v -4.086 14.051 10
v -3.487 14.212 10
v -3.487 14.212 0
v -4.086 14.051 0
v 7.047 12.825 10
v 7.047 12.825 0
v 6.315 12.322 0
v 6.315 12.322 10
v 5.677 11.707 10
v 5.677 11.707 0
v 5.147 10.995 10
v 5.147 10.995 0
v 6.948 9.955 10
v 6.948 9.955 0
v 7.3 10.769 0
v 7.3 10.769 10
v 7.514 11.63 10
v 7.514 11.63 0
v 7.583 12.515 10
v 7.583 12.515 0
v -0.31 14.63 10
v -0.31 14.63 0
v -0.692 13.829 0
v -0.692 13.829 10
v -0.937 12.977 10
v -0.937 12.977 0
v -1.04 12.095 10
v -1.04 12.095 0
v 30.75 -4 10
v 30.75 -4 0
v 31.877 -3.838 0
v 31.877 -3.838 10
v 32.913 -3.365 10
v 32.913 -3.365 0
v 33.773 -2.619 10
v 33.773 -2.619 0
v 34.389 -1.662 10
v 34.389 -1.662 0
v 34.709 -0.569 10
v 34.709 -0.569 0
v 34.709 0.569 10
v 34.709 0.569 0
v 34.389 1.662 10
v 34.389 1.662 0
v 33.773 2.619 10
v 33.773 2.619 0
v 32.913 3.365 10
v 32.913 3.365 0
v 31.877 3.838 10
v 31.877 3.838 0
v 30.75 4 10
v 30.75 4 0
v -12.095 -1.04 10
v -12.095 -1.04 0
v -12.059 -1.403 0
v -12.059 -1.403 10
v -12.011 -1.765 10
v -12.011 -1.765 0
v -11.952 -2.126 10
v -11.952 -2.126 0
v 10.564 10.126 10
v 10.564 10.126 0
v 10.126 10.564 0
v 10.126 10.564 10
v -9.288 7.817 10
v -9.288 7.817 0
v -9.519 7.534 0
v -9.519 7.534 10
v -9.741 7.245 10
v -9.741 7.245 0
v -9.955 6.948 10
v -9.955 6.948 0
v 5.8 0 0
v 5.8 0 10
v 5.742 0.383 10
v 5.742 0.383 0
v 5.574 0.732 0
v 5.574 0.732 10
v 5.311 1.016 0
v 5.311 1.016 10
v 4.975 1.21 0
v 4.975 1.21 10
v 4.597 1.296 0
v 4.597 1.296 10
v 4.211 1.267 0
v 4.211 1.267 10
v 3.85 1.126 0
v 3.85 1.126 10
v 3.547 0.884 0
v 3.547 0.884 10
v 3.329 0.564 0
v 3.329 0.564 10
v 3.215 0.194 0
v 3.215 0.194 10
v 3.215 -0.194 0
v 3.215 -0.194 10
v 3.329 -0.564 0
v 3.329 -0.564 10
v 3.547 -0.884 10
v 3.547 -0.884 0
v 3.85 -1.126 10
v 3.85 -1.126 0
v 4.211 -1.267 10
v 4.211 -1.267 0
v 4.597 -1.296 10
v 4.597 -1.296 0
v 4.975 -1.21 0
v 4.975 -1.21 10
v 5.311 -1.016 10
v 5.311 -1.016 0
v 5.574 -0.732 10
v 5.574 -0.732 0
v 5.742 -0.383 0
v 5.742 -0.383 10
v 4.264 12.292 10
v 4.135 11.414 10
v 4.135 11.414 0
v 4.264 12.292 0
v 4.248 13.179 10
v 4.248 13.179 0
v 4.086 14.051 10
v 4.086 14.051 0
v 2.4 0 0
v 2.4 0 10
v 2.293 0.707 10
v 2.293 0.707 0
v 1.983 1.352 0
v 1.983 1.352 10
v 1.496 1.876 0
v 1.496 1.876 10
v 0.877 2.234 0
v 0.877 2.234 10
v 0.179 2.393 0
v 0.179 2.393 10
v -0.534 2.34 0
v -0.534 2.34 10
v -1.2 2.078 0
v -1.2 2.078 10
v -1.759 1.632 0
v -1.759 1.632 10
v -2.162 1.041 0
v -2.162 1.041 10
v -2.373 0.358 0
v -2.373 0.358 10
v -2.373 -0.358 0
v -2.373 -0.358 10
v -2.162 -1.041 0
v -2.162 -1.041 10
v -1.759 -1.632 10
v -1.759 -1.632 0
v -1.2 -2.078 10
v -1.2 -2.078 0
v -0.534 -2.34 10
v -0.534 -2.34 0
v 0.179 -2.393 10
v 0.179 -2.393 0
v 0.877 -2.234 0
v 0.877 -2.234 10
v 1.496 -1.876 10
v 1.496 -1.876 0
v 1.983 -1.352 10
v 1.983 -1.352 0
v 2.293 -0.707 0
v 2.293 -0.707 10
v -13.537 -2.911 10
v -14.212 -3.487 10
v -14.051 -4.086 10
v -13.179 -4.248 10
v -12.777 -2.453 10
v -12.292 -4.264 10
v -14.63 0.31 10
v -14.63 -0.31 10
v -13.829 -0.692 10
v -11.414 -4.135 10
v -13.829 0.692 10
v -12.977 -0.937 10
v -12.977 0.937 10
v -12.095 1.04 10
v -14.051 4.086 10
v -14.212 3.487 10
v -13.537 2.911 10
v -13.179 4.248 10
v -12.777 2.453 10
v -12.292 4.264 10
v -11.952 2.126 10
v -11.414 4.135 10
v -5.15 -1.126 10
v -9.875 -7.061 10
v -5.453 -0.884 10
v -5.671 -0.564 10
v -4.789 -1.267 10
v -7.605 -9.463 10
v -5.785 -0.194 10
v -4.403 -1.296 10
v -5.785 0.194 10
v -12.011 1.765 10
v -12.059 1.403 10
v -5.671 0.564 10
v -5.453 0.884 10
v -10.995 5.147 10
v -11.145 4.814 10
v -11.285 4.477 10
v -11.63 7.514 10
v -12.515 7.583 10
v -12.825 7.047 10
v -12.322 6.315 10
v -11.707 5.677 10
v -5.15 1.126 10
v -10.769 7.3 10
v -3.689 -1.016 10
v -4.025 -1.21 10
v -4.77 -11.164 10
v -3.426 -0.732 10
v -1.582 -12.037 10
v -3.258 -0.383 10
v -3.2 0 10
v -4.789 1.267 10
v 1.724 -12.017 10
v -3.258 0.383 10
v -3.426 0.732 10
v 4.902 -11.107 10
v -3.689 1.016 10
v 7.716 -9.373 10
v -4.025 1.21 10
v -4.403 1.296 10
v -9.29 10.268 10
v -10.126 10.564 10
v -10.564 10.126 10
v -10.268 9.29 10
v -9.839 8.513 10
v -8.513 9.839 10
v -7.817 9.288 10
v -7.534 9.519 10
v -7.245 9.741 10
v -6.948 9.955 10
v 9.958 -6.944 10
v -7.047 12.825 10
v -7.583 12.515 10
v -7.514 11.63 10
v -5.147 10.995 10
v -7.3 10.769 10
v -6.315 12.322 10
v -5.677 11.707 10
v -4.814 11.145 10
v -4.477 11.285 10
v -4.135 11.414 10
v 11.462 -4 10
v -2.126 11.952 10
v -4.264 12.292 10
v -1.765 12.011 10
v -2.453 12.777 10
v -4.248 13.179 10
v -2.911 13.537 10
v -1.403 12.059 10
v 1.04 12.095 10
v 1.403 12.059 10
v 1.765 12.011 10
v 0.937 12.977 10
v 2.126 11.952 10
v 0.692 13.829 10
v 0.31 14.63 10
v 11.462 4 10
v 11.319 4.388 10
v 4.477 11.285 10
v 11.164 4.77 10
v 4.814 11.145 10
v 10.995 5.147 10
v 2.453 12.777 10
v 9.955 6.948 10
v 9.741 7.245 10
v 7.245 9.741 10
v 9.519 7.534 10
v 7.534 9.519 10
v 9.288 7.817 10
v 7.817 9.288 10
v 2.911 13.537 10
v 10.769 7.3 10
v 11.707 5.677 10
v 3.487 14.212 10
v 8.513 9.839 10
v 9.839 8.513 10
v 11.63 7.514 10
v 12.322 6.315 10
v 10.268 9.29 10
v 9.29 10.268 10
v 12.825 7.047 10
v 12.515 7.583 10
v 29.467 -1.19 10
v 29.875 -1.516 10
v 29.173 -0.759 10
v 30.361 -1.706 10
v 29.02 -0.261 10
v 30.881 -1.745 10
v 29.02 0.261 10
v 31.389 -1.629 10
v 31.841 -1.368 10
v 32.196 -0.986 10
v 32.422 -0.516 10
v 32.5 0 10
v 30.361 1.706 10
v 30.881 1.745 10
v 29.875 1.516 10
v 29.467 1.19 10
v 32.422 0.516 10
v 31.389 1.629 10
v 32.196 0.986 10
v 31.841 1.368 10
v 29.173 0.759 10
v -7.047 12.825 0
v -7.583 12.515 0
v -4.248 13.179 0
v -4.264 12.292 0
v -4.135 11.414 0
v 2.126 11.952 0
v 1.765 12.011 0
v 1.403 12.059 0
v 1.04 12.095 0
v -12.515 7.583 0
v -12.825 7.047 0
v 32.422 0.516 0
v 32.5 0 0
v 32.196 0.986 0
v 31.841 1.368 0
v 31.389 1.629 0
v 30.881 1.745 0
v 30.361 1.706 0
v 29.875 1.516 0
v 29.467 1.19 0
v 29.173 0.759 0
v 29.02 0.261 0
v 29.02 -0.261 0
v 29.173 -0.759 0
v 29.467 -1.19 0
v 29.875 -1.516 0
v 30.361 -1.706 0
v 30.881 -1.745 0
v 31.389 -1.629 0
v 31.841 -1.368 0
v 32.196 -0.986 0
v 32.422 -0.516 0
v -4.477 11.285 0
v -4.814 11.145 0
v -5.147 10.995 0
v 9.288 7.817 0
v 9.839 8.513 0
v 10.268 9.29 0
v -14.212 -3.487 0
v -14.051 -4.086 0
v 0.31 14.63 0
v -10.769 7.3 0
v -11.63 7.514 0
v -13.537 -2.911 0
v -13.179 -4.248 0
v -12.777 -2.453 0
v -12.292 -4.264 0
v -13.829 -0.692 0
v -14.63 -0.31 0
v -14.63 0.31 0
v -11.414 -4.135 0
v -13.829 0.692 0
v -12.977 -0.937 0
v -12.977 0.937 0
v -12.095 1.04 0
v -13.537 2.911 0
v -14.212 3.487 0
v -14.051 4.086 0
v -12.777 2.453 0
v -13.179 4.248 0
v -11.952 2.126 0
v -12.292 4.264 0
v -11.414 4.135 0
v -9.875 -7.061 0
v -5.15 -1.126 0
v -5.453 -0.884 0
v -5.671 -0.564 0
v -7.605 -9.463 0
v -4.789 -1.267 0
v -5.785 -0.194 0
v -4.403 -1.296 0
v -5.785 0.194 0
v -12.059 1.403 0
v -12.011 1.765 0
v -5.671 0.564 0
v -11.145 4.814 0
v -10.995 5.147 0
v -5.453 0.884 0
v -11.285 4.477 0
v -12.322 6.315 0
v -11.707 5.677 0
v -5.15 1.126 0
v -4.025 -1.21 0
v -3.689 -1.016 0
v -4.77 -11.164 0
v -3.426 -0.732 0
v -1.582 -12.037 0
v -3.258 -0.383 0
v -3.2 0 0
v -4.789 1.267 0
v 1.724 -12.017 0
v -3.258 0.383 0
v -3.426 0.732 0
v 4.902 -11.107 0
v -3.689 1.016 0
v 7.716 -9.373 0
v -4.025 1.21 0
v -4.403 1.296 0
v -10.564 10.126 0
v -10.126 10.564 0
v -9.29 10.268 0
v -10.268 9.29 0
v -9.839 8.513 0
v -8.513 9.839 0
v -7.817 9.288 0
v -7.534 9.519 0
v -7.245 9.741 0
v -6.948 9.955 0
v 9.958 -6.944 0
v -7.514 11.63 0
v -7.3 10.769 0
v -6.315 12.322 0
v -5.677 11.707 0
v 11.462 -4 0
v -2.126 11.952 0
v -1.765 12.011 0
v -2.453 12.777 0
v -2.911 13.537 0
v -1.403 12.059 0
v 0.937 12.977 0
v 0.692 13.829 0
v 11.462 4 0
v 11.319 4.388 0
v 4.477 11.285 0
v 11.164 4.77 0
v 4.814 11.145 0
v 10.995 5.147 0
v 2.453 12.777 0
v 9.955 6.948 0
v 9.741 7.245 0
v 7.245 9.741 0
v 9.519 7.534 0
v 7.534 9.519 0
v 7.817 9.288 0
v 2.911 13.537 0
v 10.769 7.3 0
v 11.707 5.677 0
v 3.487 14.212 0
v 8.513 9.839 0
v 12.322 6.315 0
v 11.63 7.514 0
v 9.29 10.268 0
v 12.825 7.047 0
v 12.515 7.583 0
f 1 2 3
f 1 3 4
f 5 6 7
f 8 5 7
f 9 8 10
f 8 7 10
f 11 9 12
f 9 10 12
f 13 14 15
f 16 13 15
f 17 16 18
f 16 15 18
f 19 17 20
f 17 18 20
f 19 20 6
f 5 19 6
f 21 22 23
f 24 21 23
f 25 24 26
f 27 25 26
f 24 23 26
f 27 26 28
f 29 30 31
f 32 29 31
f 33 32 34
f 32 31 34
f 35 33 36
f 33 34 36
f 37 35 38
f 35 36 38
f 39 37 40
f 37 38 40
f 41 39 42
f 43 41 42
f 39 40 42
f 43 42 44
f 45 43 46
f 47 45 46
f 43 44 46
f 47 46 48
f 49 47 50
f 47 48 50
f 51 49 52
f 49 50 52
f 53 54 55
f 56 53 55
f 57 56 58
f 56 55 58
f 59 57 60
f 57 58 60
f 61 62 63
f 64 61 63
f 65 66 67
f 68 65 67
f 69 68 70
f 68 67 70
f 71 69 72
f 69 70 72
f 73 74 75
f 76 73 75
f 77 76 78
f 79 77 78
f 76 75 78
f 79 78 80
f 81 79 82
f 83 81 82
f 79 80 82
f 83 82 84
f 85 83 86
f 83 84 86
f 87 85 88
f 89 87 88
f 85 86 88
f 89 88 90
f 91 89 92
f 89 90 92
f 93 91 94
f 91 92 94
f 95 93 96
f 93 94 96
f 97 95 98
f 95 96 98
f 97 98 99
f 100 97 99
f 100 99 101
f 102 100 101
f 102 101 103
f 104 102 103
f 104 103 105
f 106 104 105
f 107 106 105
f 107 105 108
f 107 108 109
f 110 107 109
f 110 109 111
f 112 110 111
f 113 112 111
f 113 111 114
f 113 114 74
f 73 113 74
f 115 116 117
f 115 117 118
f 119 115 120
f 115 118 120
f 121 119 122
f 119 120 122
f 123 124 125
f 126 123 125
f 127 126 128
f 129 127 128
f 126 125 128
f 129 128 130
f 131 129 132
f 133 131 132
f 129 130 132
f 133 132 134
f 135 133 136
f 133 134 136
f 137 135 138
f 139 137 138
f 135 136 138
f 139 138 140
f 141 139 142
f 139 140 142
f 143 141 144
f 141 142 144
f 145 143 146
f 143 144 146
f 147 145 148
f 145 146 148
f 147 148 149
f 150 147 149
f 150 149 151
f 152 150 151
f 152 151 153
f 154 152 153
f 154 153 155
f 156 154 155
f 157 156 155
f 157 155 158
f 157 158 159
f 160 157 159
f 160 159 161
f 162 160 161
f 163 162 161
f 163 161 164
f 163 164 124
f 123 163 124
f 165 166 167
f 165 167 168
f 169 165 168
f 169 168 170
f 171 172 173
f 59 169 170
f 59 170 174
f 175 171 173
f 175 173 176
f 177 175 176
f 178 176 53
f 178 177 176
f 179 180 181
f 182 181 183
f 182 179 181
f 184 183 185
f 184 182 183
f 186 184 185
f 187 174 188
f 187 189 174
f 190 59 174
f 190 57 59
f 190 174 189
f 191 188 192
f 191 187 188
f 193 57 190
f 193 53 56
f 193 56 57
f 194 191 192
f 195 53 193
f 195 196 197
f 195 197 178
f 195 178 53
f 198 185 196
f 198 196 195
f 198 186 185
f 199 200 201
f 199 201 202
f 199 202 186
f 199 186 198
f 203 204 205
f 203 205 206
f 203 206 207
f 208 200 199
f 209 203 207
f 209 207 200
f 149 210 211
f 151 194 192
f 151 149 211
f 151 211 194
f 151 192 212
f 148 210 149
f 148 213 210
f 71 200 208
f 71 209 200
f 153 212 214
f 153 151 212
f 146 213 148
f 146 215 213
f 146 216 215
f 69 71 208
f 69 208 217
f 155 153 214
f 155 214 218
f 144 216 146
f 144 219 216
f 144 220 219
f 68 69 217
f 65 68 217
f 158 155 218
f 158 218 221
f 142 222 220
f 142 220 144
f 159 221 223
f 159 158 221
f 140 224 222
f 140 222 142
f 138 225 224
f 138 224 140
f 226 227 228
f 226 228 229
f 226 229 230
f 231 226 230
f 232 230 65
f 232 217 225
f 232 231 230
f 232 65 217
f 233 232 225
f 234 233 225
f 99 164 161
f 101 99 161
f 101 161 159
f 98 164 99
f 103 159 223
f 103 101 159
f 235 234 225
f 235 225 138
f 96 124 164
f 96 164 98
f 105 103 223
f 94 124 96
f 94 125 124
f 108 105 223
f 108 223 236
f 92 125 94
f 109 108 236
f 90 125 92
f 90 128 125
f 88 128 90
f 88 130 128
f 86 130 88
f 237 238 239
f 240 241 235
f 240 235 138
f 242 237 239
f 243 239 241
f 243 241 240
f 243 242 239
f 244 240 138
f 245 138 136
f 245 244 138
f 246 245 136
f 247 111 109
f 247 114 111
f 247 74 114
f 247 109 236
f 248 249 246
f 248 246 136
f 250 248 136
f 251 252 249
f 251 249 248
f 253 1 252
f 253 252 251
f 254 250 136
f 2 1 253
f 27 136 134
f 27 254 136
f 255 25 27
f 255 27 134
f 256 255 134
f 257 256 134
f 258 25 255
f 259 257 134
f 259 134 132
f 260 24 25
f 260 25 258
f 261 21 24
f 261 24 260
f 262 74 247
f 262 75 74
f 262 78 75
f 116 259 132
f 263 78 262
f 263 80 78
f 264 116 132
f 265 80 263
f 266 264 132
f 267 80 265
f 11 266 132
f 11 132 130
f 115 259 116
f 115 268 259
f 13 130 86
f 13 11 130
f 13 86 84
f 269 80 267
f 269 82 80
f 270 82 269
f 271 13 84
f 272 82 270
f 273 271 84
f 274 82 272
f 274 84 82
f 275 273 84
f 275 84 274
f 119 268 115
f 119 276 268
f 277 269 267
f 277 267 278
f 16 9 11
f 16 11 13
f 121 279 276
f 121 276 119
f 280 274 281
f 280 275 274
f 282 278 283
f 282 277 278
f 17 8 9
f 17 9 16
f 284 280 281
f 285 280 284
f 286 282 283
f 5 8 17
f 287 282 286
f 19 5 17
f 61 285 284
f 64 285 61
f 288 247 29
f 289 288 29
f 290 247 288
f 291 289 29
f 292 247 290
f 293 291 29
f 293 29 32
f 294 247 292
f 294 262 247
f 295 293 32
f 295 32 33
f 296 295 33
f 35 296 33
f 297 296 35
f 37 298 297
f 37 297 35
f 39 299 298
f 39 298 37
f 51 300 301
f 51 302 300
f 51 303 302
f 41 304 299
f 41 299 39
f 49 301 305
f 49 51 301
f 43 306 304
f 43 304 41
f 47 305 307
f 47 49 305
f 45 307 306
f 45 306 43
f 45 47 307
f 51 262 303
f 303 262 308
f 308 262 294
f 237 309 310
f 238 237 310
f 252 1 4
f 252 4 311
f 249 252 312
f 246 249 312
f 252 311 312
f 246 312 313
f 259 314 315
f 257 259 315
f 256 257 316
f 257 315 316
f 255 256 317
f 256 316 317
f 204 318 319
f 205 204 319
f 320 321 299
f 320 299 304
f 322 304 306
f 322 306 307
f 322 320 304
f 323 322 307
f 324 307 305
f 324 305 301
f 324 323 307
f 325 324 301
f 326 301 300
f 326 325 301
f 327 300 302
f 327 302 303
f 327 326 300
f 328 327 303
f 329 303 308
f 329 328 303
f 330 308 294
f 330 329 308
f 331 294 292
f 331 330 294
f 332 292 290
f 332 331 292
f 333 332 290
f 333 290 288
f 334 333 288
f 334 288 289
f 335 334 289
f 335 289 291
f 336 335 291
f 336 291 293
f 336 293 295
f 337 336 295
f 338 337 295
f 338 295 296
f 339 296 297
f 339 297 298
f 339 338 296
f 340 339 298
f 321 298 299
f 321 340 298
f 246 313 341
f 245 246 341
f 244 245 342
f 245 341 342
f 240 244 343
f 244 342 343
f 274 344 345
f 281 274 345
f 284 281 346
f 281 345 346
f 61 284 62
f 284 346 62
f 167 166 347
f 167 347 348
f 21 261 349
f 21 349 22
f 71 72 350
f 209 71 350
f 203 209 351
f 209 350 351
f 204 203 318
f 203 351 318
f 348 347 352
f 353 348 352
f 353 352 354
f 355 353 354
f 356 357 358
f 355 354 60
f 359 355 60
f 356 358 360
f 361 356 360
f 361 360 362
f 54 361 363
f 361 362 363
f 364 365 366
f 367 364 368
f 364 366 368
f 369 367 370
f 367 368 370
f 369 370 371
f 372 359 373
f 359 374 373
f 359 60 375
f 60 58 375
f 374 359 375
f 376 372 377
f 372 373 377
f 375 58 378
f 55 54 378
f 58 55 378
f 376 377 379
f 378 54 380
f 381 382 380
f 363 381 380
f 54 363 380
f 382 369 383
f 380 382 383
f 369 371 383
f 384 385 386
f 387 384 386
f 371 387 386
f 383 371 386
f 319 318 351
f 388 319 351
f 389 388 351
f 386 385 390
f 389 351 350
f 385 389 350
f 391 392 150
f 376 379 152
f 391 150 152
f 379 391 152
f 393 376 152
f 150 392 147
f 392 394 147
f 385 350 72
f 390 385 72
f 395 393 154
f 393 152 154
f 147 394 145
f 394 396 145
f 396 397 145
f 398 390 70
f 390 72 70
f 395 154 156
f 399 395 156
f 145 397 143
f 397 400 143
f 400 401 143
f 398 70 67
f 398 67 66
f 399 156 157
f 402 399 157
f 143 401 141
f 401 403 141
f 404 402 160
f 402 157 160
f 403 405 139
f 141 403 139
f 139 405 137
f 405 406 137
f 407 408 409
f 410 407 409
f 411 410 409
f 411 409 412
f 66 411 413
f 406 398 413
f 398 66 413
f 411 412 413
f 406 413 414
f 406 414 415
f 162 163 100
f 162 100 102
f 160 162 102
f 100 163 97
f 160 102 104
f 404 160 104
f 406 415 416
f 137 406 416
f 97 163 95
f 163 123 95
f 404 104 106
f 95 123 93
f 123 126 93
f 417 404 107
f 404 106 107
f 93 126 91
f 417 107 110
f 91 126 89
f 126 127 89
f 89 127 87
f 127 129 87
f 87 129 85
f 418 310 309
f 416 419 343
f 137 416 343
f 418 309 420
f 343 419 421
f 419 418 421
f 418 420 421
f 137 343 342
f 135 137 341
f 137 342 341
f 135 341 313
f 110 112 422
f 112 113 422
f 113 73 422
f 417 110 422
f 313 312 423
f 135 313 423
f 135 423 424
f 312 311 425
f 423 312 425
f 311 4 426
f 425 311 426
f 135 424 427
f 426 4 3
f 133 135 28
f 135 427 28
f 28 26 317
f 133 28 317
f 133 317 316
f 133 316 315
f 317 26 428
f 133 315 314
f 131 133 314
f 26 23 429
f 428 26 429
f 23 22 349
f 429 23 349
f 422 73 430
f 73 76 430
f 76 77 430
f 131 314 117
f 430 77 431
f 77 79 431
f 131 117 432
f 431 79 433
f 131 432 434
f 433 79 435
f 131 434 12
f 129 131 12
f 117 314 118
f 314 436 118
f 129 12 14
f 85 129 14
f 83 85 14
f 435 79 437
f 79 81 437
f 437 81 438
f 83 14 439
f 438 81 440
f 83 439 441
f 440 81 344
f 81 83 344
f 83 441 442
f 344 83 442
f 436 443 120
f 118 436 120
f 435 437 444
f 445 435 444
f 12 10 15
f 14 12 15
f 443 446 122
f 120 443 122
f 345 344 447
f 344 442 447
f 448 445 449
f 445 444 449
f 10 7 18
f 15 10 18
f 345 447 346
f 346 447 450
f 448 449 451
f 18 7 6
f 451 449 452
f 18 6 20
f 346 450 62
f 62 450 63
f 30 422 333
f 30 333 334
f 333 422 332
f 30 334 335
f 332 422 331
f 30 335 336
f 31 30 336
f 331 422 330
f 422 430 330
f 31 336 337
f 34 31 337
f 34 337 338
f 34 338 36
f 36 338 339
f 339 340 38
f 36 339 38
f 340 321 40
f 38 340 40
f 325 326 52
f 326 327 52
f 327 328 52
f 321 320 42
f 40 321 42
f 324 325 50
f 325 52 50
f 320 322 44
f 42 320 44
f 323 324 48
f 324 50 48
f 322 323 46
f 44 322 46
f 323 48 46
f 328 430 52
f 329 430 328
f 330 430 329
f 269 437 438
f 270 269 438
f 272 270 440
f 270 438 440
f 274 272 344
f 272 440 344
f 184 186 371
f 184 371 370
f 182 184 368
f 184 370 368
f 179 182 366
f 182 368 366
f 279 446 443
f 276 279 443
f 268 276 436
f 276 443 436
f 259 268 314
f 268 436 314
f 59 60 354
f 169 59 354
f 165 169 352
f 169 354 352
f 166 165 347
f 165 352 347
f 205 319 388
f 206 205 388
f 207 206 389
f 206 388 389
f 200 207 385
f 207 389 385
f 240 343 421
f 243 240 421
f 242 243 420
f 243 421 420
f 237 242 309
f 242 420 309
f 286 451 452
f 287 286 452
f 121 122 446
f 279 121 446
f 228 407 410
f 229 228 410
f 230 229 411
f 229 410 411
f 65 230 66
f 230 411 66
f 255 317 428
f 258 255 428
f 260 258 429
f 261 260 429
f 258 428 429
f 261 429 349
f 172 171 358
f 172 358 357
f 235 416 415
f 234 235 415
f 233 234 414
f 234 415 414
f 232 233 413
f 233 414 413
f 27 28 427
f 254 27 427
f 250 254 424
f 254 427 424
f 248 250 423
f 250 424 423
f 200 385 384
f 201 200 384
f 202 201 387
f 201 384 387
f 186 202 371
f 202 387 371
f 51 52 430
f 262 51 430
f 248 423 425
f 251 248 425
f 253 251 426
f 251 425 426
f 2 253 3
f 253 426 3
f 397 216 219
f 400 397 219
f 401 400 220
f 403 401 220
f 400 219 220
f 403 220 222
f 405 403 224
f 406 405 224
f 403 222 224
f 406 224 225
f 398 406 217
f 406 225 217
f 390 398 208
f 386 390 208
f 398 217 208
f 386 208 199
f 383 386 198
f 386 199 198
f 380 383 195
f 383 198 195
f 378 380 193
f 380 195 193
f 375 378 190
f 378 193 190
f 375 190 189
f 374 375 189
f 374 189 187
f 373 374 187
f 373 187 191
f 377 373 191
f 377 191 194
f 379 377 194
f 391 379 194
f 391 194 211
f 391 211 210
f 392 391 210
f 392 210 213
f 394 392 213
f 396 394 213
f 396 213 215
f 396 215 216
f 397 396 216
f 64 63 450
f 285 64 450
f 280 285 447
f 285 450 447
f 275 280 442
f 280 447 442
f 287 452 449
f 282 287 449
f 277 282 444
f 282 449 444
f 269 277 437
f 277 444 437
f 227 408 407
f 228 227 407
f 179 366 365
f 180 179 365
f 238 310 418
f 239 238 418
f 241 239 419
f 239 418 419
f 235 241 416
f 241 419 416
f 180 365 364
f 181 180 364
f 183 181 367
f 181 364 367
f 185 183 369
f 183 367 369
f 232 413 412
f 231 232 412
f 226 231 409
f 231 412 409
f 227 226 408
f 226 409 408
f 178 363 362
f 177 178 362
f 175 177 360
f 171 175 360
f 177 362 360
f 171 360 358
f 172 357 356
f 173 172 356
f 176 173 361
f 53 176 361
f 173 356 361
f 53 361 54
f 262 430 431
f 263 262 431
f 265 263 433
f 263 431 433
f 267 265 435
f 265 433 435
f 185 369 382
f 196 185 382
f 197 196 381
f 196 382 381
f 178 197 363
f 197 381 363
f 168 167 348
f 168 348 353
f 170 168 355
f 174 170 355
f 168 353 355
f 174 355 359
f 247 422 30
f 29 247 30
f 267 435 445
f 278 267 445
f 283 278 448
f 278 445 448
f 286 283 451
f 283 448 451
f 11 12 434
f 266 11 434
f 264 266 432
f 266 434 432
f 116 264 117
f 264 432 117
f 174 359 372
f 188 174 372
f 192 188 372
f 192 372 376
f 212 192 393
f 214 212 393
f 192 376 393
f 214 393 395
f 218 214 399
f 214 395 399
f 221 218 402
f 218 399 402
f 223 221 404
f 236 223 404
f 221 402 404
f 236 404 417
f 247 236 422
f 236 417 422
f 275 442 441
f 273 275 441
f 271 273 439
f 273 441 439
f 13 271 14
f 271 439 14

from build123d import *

# Parameters (mm, degrees)
SKETCH1_R           = 1.75
BOSS_EXTRUDE1_DEPTH = 10
SKETCH2_R           = 2.4
SKETCH2_R_2         = 1.3
CUT_EXTRUDE1_DEPTH  = 40.007683858


with BuildPart() as part:
    # Sketch1 → Boss-Extrude1 (new body)
    with BuildSketch(Plane.XY):
        with BuildLine():
            Line((0.31, 14.63), (-0.31, 14.63))
            ThreePointArc((-0.31, 14.63), (-0.832135832, 13.407942292), (-1.04, 12.095371015))
            ThreePointArc((-1.04, 12.095371015), (-1.584587974, 12.036140617), (-2.125949517, 11.952403049))
            ThreePointArc((-2.125949517, 11.952403049), (-2.66644933, 13.166450339), (-3.487085624, 14.211728743))
            Line((-3.487085624, 14.211728743), (-4.085959636, 14.051260935))
            ThreePointArc((-4.085959636, 14.051260935), (-4.274012312, 12.735705136), (-4.135075236, 11.414059435))
            ThreePointArc((-4.135075236, 11.414059435), (-4.645776869, 11.215897525), (-5.147019088, 10.994898568))
            ThreePointArc((-5.147019088, 10.994898568), (-5.983320376, 12.027686554), (-7.046532125, 12.824951657))
            Line((-7.046532125, 12.824951657), (-7.583467875, 12.514951657))
            ThreePointArc((-7.583467875, 12.514951657), (-7.424621916, 11.195550721), (-6.948351928, 9.954898568))
            ThreePointArc((-6.948351928, 9.954898568), (-7.390363748, 9.631309551), (-7.817327814, 9.288109918))
            ThreePointArc((-7.817327814, 9.288109918), (-8.892438027, 10.069255806), (-10.125769107, 10.564175311))
            Line((-10.125769107, 10.564175311), (-10.564175311, 10.125769107))
            ThreePointArc((-10.564175311, 10.125769107), (-10.069255806, 8.892438027), (-9.288109918, 7.817327814))
            ThreePointArc((-9.288109918, 7.817327814), (-9.631309551, 7.390363748), (-9.954898568, 6.948351928))
            ThreePointArc((-9.954898568, 6.948351928), (-11.195550721, 7.424621916), (-12.514951657, 7.583467875))
            Line((-12.514951657, 7.583467875), (-12.824951657, 7.046532125))
            ThreePointArc((-12.824951657, 7.046532125), (-12.027686554, 5.983320376), (-10.994898568, 5.147019088))
            ThreePointArc((-10.994898568, 5.147019088), (-11.215897525, 4.645776869), (-11.414059435, 4.135075236))
            ThreePointArc((-11.414059435, 4.135075236), (-12.735705136, 4.274012312), (-14.051260935, 4.085959636))
            Line((-14.051260935, 4.085959636), (-14.211728743, 3.487085624))
            ThreePointArc((-14.211728743, 3.487085624), (-13.166450339, 2.66644933), (-11.952403049, 2.125949517))
            ThreePointArc((-11.952403049, 2.125949517), (-12.036140617, 1.584587974), (-12.095371015, 1.04))
            ThreePointArc((-12.095371015, 1.04), (-13.407942292, 0.832135832), (-14.63, 0.31))
            Line((-14.63, 0.31), (-14.63, -0.31))
            ThreePointArc((-14.63, -0.31), (-13.407942292, -0.832135832), (-12.095371015, -1.04))
            ThreePointArc((-12.095371015, -1.04), (-12.036140617, -1.584587974), (-11.952403049, -2.125949517))
            ThreePointArc((-11.952403049, -2.125949517), (-13.166450339, -2.66644933), (-14.211728743, -3.487085624))
            Line((-14.211728743, -3.487085624), (-14.051260935, -4.085959636))
            ThreePointArc((-14.051260935, -4.085959636), (-12.735705136, -4.274012312), (-11.414059435, -4.135075236))
            ThreePointArc((-11.414059435, -4.135075236), (0.071680966, -12.139788377), (11.46209405, -4))
            Line((11.46209405, -4), (30.75, -4))
            ThreePointArc((30.75, -4), (34.75, 0), (30.75, 4))
            Line((30.75, 4), (11.46209405, 4))
            ThreePointArc((11.46209405, 4), (11.243133129, 4.579471307), (10.994898568, 5.147019088))
            ThreePointArc((10.994898568, 5.147019088), (12.027686554, 5.983320376), (12.824951657, 7.046532125))
            Line((12.824951657, 7.046532125), (12.514951657, 7.583467875))
            ThreePointArc((12.514951657, 7.583467875), (11.195550721, 7.424621916), (9.954898568, 6.948351928))
            ThreePointArc((9.954898568, 6.948351928), (9.631309551, 7.390363748), (9.288109918, 7.817327814))
            ThreePointArc((9.288109918, 7.817327814), (10.069255806, 8.892438027), (10.564175311, 10.125769107))
            Line((10.564175311, 10.125769107), (10.125769107, 10.564175311))
            ThreePointArc((10.125769107, 10.564175311), (8.892438027, 10.069255806), (7.817327814, 9.288109918))
            ThreePointArc((7.817327814, 9.288109918), (7.390363748, 9.631309551), (6.948351928, 9.954898568))
            ThreePointArc((6.948351928, 9.954898568), (7.424621916, 11.195550721), (7.583467875, 12.514951657))
            Line((7.583467875, 12.514951657), (7.046532125, 12.824951657))
            ThreePointArc((7.046532125, 12.824951657), (5.983320376, 12.027686554), (5.147019088, 10.994898568))
            ThreePointArc((5.147019088, 10.994898568), (4.645776869, 11.215897525), (4.135075236, 11.414059435))
            ThreePointArc((4.135075236, 11.414059435), (4.274012312, 12.735705136), (4.085959636, 14.051260935))
            Line((4.085959636, 14.051260935), (3.487085624, 14.211728743))
            ThreePointArc((3.487085624, 14.211728743), (2.66644933, 13.166450339), (2.125949517, 11.952403049))
            ThreePointArc((2.125949517, 11.952403049), (1.584587974, 12.036140617), (1.04, 12.095371015))
            ThreePointArc((1.04, 12.095371015), (0.832135832, 13.407942292), (0.31, 14.63))
        make_face()
        Circle(SKETCH1_R, mode=Mode.SUBTRACT)
        with Locations((30.75, 0)):
            Circle(SKETCH1_R, mode=Mode.SUBTRACT)
    extrude(amount=BOSS_EXTRUDE1_DEPTH)

    # Sketch2 → Cut-Extrude1 (cut, through all)
    with BuildSketch(Plane.XY.offset(10)):
        Circle(SKETCH2_R)
        with Locations((-4.5, 0)):
            Circle(SKETCH2_R_2)
        with Locations((4.5, 0)):
            Circle(SKETCH2_R_2)
    extrude(amount=-CUT_EXTRUDE1_DEPTH, mode=Mode.SUBTRACT)


solid = part.part
